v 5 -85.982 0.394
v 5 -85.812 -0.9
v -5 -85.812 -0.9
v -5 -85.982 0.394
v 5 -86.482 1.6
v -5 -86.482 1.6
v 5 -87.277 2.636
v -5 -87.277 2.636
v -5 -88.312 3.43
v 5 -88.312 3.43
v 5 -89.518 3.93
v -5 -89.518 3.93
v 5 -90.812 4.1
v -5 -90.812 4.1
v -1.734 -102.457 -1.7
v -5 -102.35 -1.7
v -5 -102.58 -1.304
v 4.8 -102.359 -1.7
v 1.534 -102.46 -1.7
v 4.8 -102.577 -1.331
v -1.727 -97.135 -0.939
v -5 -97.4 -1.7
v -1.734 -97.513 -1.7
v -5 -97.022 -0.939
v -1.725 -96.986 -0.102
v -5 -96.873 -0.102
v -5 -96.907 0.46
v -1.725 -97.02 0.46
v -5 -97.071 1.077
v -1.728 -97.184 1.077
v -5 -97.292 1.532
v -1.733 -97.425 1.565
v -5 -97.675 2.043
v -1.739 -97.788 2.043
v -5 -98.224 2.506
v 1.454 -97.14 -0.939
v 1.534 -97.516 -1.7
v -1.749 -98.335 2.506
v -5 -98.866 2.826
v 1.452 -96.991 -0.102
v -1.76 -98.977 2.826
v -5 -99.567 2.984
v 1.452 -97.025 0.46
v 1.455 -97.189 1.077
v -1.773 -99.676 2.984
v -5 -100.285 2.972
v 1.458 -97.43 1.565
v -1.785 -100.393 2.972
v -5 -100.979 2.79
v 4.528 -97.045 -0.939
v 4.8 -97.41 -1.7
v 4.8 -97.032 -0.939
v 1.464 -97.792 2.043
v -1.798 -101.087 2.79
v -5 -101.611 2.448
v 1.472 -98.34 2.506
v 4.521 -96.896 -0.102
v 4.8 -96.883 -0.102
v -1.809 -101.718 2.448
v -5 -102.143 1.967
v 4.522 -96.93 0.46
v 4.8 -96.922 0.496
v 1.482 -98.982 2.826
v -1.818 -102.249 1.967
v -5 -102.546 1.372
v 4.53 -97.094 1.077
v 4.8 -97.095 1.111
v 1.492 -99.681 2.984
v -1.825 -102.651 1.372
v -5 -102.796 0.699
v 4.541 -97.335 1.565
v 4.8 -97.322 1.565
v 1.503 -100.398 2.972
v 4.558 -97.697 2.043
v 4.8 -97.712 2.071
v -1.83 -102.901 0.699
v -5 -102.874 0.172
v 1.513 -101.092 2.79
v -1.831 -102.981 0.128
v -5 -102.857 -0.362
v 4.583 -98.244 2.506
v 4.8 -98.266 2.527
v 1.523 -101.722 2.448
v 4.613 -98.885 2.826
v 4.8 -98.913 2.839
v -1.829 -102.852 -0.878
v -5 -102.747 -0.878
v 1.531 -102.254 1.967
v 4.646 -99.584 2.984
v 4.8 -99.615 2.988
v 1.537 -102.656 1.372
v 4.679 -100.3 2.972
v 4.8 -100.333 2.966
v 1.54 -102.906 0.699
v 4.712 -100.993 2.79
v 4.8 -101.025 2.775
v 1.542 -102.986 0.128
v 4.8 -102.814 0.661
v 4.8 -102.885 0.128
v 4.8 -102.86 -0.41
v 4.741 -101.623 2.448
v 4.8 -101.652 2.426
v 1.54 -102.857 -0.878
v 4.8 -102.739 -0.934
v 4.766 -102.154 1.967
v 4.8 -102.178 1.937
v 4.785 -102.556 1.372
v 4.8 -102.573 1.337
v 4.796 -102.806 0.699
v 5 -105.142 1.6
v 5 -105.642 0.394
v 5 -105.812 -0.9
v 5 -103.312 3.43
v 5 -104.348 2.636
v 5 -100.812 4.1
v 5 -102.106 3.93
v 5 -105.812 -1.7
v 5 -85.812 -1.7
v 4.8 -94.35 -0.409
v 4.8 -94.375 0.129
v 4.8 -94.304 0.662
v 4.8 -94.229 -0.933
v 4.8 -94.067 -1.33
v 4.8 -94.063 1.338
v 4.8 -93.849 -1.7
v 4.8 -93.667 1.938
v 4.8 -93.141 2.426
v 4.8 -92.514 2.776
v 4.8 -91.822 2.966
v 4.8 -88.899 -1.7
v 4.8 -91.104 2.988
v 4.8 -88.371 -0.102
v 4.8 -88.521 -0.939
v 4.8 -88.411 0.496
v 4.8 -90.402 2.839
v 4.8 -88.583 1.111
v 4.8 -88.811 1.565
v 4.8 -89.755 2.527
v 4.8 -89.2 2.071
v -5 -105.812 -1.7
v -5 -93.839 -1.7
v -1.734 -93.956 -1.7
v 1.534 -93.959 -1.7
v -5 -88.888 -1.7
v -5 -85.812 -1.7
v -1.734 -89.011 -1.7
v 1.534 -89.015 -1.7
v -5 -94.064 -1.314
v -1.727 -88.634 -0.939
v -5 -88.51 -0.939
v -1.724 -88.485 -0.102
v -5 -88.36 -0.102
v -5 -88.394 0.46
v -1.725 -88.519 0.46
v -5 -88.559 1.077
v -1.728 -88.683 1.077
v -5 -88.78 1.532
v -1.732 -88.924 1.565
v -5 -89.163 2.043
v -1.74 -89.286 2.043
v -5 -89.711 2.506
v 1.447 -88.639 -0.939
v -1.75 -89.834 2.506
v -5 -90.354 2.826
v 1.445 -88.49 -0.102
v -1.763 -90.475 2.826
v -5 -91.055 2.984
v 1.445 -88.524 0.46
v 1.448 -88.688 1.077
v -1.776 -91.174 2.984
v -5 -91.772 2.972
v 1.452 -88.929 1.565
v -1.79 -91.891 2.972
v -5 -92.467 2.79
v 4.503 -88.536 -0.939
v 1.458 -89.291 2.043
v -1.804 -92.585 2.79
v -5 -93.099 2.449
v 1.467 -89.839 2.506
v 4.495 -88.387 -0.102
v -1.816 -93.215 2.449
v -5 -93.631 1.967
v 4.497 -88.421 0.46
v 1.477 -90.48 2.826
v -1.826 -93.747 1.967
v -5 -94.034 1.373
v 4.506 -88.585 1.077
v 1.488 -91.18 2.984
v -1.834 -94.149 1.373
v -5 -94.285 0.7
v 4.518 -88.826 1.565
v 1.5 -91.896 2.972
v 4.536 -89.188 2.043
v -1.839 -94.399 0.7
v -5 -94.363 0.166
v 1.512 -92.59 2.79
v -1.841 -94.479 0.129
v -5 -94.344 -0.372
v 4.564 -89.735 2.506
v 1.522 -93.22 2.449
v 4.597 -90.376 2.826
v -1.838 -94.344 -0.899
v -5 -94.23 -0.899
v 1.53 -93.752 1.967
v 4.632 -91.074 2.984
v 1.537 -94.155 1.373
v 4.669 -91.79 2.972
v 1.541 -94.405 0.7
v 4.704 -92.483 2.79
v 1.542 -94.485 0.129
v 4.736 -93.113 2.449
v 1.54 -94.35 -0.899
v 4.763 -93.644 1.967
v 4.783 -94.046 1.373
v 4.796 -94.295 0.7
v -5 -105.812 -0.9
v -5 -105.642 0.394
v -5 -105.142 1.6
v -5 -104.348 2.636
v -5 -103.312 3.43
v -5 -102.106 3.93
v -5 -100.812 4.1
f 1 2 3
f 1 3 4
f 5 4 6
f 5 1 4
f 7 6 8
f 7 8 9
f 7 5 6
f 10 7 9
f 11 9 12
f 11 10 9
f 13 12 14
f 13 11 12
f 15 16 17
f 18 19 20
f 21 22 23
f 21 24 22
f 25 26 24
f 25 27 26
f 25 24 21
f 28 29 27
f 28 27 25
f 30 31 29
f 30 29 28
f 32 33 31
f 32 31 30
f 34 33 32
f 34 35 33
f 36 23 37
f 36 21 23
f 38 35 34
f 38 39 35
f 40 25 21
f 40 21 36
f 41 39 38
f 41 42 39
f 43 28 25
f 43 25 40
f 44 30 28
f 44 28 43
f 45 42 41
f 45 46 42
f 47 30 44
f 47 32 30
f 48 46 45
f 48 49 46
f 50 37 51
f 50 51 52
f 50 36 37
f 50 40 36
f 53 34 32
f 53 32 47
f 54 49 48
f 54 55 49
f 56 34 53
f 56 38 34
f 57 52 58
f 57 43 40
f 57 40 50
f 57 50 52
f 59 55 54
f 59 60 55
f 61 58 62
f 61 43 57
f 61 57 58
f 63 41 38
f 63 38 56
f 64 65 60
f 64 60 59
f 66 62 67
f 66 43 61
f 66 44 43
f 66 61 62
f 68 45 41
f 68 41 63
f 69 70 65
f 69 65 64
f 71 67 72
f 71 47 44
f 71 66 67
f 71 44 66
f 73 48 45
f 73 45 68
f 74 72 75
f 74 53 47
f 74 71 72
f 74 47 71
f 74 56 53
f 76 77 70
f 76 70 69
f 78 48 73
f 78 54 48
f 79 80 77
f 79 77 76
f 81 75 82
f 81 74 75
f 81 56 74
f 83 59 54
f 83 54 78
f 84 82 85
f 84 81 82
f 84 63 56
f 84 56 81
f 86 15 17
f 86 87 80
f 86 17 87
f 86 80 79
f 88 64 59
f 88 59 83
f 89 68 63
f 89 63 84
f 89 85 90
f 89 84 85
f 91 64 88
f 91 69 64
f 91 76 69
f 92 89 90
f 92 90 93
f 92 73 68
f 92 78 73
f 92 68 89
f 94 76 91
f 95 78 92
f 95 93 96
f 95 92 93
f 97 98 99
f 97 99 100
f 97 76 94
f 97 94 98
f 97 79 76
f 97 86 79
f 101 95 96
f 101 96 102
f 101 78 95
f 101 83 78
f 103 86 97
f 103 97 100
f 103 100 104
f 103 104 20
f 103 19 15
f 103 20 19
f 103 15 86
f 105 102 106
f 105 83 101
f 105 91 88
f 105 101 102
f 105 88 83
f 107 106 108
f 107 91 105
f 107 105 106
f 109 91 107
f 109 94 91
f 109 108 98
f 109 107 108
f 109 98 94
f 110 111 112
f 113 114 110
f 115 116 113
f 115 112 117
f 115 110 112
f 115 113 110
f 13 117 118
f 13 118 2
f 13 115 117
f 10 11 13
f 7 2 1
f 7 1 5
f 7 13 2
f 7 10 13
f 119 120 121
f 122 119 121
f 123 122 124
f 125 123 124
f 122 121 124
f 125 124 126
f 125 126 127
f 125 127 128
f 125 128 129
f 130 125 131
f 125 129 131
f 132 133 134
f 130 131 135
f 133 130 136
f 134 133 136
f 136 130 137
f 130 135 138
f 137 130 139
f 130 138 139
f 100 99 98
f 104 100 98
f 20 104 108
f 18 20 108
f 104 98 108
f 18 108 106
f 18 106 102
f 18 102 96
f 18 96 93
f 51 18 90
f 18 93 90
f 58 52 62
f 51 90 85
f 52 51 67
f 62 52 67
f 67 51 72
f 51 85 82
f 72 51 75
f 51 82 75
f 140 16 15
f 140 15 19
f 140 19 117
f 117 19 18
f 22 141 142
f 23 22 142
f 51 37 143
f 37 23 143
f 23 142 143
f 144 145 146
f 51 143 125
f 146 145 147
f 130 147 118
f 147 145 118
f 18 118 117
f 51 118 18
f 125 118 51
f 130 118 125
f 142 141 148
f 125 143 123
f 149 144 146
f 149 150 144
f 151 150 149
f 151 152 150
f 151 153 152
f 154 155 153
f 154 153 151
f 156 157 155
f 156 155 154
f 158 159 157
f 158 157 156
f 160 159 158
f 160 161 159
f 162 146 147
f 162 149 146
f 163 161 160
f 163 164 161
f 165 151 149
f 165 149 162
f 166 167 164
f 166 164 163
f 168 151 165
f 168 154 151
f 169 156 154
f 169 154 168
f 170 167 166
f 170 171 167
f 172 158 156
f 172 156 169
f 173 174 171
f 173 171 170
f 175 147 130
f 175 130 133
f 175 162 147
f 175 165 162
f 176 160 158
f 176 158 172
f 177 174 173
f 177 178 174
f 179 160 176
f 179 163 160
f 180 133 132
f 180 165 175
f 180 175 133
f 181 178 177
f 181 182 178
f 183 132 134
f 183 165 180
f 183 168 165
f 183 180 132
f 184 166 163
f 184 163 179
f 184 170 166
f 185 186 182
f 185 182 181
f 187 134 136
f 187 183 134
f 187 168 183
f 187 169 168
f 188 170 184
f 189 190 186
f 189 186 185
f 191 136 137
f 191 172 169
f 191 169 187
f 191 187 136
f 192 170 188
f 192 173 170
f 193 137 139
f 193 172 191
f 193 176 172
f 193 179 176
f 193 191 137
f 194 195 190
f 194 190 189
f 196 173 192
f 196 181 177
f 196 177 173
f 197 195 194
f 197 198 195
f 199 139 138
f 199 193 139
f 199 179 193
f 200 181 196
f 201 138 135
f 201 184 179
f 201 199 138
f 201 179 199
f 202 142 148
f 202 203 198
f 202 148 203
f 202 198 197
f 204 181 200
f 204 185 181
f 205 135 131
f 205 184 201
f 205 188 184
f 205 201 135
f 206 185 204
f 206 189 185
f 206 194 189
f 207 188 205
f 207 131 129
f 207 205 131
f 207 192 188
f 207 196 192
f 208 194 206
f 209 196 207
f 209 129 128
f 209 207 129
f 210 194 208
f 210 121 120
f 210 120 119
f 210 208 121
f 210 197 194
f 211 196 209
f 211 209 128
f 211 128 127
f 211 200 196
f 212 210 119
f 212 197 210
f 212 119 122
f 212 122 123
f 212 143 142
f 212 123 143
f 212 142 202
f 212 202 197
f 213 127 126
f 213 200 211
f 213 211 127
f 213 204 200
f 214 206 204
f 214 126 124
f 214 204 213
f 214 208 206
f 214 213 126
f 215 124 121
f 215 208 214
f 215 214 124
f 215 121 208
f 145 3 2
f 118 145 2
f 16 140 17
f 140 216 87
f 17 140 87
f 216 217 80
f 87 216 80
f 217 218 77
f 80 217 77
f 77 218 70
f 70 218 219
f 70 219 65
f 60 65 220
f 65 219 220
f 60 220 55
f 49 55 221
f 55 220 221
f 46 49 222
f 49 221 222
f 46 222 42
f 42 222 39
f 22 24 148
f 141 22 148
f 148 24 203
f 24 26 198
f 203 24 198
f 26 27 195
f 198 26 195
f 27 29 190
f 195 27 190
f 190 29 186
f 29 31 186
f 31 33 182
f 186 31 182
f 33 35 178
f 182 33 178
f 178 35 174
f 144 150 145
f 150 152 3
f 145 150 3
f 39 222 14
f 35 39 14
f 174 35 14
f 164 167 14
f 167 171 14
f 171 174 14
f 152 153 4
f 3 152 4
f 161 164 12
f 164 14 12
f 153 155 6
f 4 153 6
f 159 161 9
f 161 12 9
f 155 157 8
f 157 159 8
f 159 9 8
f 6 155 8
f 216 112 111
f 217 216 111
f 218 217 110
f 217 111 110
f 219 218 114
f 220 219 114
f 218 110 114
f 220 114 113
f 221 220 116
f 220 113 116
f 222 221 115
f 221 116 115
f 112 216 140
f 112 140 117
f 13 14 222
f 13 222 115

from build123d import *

# Parameters (mm, degrees)
F5_W      = 10
F5_H      = 20
F6_DEPTH  = 5.8
F0_R      = 3
F2_R      = 3
F9_R      = 5
F11_DEPTH = 0.2


with BuildPart() as f6:
    # F5 (on offset) → F6 (new body)
    with BuildSketch(Plane.XY.offset(4.1)):
        with Locations((0, -95.8120375872)):
            Rectangle(F5_W, F5_H)
    extrude(amount=-F6_DEPTH)

    # F0 (on Front) → F7 (revolve, cut)
    with BuildSketch(Plane.XZ):
        with Locations((-91.5, 0)):
            Circle(F0_R)
    revolve(axis=Axis((0, 0, 0), (0, 0, 1)), mode=Mode.SUBTRACT)

    # F2 (on Front) → F8 (revolve, cut)
    with BuildSketch(Plane.XZ):
        with Locations((-100, 0)):
            Circle(F2_R)
    revolve(axis=Axis((0, 0, 0), (0, 0, 1)), mode=Mode.SUBTRACT)

    # F9
    f9_edges = [f6.edges().sort_by_distance(p)[0] for p in [
        (0, -105.812038, 4.1),
        (0, -85.812038, 4.1),
    ]]
    fillet(f9_edges, radius=F9_R)

    # F10 (on face) → F11 (join)
    with BuildSketch(Plane.YZ.offset(5)):
        with BuildLine():
            Line((-90.8120375872, 4.1), (-100.8120375872, 4.1))
            ThreePointArc((-100.8120375872, 4.1), (-104.3475714931, 2.6355339059), (-105.8120375872, -0.9))
            Line((-105.8120375872, -0.9), (-105.8120375872, -1.7))
            Line((-105.8120375872, -1.7), (-85.8120375872, -1.7))
            Line((-85.8120375872, -1.7), (-85.8120375872, -0.9))
            ThreePointArc((-85.8120375872, -0.9), (-87.2765036812, 2.6355339059), (-90.8120375872, 4.1))
        make_face()
    extrude(amount=-F11_DEPTH)


solid = f6.part
